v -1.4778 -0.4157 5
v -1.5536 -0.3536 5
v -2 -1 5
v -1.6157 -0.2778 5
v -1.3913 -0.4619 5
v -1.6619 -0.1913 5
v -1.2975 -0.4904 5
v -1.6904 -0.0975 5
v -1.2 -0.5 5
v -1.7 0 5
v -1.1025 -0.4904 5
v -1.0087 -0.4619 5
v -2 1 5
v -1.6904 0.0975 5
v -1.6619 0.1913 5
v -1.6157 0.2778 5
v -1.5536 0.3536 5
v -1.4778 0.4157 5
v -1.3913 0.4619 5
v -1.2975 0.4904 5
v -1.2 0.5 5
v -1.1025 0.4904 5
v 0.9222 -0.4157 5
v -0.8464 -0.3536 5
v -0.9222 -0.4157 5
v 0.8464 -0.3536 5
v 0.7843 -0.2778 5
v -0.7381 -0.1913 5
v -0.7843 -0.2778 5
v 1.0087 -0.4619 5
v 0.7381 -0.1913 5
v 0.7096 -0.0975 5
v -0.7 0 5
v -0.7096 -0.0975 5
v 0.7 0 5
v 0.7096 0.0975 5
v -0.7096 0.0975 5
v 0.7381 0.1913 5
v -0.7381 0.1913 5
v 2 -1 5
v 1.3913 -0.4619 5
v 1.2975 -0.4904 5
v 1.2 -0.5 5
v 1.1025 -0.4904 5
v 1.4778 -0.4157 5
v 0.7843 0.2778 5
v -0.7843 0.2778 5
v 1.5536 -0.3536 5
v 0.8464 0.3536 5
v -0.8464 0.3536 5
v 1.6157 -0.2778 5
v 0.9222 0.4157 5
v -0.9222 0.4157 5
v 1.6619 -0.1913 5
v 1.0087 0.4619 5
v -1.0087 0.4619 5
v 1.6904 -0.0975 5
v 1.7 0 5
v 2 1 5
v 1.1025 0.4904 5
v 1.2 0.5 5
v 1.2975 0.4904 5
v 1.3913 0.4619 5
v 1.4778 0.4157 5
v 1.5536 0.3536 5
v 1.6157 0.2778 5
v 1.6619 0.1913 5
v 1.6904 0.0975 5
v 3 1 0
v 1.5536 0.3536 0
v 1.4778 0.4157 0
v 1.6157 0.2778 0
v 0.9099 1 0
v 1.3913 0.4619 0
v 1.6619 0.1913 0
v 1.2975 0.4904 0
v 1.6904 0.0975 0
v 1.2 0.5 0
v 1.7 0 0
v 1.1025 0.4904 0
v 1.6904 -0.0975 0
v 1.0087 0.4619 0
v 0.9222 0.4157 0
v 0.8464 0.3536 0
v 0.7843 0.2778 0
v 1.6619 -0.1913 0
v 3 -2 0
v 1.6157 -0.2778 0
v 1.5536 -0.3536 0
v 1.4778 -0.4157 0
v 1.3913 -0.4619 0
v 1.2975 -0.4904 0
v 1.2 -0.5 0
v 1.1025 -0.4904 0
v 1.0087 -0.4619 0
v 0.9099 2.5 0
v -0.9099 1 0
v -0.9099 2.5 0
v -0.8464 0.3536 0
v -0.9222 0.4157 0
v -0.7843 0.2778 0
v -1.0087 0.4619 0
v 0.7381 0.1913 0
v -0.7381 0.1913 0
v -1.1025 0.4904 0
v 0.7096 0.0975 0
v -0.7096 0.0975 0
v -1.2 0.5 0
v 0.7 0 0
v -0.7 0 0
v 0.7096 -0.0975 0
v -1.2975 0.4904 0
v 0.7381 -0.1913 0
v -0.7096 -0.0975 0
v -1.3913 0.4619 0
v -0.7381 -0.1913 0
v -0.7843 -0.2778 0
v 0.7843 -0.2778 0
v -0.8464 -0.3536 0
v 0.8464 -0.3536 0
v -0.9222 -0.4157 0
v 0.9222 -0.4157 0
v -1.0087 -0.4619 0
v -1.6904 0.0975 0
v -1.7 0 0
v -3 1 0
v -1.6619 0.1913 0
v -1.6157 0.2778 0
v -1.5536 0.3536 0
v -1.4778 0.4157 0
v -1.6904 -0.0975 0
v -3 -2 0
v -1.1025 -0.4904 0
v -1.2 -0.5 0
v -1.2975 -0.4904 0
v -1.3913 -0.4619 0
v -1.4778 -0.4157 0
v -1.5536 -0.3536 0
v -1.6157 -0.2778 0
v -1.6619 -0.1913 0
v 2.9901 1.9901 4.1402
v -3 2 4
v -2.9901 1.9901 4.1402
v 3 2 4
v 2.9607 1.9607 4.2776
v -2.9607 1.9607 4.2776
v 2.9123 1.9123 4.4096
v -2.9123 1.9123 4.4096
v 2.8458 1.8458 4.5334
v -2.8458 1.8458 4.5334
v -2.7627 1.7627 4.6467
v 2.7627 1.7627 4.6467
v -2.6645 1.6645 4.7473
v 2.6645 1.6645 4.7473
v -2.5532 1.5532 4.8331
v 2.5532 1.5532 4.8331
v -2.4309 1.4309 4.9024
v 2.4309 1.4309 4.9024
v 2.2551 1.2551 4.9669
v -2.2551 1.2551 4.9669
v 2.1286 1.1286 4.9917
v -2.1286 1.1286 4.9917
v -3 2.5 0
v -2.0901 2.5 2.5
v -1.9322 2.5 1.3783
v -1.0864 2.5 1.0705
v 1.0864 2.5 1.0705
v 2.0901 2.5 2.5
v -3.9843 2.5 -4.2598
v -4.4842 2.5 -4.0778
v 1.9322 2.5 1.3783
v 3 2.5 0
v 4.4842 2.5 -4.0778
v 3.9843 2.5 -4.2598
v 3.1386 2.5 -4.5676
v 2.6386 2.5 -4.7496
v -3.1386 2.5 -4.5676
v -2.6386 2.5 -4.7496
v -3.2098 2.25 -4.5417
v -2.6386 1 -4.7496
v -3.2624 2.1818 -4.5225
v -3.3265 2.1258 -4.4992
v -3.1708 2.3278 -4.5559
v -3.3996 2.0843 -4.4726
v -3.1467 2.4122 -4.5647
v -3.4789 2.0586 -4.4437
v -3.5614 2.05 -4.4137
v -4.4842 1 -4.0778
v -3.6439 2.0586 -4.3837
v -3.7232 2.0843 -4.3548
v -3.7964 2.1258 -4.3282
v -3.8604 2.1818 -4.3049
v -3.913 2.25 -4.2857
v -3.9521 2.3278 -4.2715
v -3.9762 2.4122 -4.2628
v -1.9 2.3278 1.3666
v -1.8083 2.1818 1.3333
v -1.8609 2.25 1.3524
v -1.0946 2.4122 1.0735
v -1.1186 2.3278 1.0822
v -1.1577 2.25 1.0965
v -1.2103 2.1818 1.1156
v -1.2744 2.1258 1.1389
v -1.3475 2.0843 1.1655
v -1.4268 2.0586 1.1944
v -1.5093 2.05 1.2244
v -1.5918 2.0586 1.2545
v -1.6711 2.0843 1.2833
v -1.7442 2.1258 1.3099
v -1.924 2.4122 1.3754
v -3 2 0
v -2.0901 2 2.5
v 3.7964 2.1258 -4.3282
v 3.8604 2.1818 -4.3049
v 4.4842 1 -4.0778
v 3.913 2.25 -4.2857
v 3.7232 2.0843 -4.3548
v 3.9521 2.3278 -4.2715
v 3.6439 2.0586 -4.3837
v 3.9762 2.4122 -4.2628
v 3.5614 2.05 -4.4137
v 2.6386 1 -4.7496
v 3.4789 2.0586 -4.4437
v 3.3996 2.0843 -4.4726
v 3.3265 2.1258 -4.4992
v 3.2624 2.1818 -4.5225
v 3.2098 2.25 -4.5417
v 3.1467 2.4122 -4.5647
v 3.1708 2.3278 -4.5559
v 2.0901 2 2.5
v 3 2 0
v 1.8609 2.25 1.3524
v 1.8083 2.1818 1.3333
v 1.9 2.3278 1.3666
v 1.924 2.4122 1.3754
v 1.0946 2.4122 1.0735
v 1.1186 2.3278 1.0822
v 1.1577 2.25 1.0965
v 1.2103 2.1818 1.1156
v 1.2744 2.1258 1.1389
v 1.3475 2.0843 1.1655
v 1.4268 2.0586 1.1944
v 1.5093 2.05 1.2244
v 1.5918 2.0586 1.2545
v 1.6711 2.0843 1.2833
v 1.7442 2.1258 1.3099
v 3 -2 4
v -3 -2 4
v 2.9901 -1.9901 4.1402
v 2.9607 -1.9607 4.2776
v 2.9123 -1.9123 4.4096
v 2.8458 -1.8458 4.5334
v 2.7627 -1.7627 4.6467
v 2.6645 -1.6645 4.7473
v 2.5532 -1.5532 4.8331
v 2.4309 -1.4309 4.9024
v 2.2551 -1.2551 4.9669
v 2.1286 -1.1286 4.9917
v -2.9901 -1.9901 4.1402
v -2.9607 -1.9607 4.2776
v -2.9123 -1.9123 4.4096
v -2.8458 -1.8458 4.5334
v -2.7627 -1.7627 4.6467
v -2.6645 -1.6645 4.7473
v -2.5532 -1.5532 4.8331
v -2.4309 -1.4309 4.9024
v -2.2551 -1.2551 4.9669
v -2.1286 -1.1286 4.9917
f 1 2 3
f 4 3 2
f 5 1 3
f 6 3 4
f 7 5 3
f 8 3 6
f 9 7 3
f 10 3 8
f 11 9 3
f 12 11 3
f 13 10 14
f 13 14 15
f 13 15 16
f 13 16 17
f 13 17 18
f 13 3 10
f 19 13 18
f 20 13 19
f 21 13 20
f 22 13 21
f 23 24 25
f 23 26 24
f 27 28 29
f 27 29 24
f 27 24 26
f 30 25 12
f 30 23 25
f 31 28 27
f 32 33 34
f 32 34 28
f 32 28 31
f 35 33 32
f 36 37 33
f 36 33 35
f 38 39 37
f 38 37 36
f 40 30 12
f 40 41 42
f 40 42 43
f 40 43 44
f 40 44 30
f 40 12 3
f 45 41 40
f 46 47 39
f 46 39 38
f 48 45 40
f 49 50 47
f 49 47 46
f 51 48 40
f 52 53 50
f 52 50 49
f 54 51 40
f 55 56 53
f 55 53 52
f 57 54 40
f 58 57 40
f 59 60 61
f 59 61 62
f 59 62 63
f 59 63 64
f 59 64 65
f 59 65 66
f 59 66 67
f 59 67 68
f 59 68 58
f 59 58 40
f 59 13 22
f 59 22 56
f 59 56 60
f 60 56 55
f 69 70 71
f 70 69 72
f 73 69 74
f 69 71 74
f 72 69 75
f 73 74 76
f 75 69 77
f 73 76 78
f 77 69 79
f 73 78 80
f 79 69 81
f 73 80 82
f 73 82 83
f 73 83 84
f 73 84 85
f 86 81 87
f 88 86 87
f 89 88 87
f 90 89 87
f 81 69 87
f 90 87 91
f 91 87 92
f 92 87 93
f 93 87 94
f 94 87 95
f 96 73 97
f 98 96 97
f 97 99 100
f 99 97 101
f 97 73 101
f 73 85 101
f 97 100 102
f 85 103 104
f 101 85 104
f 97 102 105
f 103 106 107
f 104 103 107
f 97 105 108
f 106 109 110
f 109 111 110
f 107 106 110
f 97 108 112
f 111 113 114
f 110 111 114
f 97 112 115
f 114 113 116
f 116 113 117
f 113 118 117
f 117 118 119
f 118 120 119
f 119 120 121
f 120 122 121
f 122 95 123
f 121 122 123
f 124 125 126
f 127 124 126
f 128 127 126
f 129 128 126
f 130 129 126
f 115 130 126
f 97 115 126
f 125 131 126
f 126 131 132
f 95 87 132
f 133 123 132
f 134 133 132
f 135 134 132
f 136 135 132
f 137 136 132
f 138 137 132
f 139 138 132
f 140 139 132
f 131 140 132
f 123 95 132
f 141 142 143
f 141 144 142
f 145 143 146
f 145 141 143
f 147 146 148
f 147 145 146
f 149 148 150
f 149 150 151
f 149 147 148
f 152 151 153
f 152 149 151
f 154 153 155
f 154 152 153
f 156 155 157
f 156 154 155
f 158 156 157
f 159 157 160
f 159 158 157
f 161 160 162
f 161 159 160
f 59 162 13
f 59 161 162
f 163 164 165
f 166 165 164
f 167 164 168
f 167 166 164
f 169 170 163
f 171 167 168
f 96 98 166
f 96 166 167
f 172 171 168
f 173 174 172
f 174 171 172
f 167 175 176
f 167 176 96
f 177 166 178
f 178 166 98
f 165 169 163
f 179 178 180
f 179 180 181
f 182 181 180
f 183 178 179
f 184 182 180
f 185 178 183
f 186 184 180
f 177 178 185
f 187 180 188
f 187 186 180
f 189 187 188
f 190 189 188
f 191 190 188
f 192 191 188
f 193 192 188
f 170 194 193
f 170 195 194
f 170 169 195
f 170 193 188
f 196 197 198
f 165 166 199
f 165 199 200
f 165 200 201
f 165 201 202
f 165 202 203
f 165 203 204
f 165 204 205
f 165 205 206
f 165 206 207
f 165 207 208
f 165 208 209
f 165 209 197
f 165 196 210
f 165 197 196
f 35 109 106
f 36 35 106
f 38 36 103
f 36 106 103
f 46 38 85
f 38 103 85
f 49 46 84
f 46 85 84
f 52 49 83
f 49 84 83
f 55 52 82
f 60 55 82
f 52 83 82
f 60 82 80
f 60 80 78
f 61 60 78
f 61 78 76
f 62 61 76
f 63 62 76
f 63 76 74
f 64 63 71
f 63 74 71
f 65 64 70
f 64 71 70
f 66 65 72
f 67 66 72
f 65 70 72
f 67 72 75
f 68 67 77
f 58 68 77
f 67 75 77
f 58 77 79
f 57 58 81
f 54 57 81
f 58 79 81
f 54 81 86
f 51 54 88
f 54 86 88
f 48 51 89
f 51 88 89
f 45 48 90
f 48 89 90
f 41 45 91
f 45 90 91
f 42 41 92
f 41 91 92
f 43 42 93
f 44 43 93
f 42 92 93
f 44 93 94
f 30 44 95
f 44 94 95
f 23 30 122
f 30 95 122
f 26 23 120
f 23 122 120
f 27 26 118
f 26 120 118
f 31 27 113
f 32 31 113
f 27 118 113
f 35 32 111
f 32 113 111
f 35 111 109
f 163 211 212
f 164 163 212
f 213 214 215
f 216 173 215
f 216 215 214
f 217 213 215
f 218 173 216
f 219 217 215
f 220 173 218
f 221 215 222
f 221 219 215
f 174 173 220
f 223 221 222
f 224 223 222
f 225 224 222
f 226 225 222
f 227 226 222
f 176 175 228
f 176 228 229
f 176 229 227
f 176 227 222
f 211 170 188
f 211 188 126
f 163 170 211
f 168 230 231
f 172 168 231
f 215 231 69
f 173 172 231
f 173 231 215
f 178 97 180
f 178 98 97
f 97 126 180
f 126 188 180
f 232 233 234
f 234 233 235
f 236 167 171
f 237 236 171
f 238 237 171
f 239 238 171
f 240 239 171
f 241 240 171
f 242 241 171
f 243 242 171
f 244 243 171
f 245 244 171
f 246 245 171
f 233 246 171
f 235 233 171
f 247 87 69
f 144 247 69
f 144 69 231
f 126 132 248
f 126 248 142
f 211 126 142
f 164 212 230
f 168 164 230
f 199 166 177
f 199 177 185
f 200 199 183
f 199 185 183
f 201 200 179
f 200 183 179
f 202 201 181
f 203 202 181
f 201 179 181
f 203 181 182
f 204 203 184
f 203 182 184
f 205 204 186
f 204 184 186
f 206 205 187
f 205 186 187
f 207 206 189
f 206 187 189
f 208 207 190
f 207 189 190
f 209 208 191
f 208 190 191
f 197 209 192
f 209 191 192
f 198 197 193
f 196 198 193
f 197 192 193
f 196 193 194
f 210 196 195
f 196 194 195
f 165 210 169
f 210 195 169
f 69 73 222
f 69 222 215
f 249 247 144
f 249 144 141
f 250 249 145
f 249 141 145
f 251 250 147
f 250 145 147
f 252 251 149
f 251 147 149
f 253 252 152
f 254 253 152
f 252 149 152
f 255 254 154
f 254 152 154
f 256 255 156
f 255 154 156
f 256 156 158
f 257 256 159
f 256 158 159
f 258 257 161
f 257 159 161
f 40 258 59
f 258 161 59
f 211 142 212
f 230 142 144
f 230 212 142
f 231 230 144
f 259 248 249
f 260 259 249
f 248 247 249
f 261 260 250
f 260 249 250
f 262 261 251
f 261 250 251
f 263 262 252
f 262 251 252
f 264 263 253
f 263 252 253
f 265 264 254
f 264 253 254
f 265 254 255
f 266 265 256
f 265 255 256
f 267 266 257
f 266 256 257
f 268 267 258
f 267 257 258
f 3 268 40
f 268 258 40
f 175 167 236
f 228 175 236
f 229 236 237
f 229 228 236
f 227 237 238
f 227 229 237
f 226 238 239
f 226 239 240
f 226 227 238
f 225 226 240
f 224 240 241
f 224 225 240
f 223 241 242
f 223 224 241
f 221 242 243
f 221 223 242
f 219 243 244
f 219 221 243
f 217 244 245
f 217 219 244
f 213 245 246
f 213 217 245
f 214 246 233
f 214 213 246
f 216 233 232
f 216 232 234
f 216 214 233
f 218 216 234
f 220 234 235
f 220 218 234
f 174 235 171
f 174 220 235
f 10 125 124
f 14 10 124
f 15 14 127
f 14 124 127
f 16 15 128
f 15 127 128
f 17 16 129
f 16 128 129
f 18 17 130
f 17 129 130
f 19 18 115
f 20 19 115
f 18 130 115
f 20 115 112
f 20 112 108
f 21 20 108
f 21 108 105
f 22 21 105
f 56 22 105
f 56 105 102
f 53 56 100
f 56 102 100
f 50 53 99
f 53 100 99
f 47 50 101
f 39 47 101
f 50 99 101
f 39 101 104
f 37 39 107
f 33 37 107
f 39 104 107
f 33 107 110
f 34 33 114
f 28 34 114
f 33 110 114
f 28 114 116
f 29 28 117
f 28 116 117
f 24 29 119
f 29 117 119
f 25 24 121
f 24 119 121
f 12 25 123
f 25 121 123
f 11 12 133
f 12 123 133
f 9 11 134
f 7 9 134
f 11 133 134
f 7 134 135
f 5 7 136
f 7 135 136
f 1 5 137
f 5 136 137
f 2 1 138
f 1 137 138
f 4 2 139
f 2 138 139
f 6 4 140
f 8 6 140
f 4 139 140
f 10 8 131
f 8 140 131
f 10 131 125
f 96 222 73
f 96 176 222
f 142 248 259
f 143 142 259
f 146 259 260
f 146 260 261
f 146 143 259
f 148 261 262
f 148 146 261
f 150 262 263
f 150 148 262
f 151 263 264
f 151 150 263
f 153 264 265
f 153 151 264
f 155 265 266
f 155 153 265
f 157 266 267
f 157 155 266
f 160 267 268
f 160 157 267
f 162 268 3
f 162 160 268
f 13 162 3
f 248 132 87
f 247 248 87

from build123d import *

# Parameters (mm, degrees)
SKETCH_1_W          = 6
SKETCH_1_H          = 4
EXTRUDE_1_DEPTH     = 5
SKETCH_2_R          = 0.5
CUT_EXTRUDE_1_DEPTH = 5
EXTRUDE_2_DEPTH     = 0.5
EXTRUDE_3_DEPTH     = 1
SKETCH_5_R          = 0.45
CUT_EXTRUDE_2_DEPTH = 6
FILLET_1_R          = 1


with BuildPart() as part:
    # 草图1 → 凸台-拉伸1 (new body)
    with BuildSketch(Plane.XY):
        Rectangle(SKETCH_1_W, SKETCH_1_H)
    extrude(amount=EXTRUDE_1_DEPTH)

    # 草图2 → 切除-拉伸1 (cut)
    with BuildSketch(Plane(origin=(0, 0, 0), x_dir=(-1, 0, 0), z_dir=(0, 0, -1))):
        with Locations((-1.2, 0)):
            Circle(SKETCH_2_R)
        with Locations((1.2, 0)):
            Circle(SKETCH_2_R)
    extrude(amount=-CUT_EXTRUDE_1_DEPTH, mode=Mode.SUBTRACT)

    # 草图3 → 凸台-拉伸2 (add)
    with BuildSketch(Plane(origin=(0, 2, 0), x_dir=(1, 0, 0), z_dir=(0, 1, 0))):
        Polygon((-2.090074414, -2.5), (2.090074414, -2.5), (4.484215418, 4.077848346), (2.638633265, 4.749585314), (0.909925586, 0), (-0.909925586, 0), (-2.638633265, 4.749585314), (-4.484215418, 4.077848346), align=None)
    extrude(amount=EXTRUDE_2_DEPTH)

    # 草图3<7> → 凸台-拉伸3 (add)
    with BuildSketch(Plane(origin=(0, 2, 0), x_dir=(1, 0, 0), z_dir=(0, 1, 0))):
        Polygon((-2.090074414, -2.5), (0, -2.5), (-2.638633265, 4.749585314), (-4.484215418, 4.077848346), align=None)
        Polygon((0, -2.5), (2.090074414, -2.5), (4.484215418, 4.077848346), (2.638633265, 4.749585314), align=None)
    extrude(amount=-EXTRUDE_3_DEPTH)

    # 草图5 → 切除-拉伸2 (cut)
    with BuildSketch(Plane(origin=(-1.835148753, 0, -5.04202976), x_dir=(-0.9396926207859081, 0, 0.34202014332566977), z_dir=(-0.3420201433256697, 0, -0.939692620785908))):
        with Locations((1.83706411, 2.5)):
            Circle(SKETCH_5_R)
    cut_extrude_2 = extrude(amount=-CUT_EXTRUDE_2_DEPTH, mode=Mode.SUBTRACT)

    # 镜向1: 切除-拉伸2 across plane
    add(cut_extrude_2.mirror(Plane(origin=(0, 0, 0), x_dir=(0, 0, 1), z_dir=(1, 0, 0))), mode=Mode.SUBTRACT)

    # 圆角1
    fillet_1_edges = [part.edges().sort_by_distance(p)[0] for p in [
        (-3, 0, 5),
        (3, 0, 5),
        (0, -2, 5),
        (0, 2, 5),
    ]]
    fillet(fillet_1_edges, radius=FILLET_1_R)


solid = part.part
